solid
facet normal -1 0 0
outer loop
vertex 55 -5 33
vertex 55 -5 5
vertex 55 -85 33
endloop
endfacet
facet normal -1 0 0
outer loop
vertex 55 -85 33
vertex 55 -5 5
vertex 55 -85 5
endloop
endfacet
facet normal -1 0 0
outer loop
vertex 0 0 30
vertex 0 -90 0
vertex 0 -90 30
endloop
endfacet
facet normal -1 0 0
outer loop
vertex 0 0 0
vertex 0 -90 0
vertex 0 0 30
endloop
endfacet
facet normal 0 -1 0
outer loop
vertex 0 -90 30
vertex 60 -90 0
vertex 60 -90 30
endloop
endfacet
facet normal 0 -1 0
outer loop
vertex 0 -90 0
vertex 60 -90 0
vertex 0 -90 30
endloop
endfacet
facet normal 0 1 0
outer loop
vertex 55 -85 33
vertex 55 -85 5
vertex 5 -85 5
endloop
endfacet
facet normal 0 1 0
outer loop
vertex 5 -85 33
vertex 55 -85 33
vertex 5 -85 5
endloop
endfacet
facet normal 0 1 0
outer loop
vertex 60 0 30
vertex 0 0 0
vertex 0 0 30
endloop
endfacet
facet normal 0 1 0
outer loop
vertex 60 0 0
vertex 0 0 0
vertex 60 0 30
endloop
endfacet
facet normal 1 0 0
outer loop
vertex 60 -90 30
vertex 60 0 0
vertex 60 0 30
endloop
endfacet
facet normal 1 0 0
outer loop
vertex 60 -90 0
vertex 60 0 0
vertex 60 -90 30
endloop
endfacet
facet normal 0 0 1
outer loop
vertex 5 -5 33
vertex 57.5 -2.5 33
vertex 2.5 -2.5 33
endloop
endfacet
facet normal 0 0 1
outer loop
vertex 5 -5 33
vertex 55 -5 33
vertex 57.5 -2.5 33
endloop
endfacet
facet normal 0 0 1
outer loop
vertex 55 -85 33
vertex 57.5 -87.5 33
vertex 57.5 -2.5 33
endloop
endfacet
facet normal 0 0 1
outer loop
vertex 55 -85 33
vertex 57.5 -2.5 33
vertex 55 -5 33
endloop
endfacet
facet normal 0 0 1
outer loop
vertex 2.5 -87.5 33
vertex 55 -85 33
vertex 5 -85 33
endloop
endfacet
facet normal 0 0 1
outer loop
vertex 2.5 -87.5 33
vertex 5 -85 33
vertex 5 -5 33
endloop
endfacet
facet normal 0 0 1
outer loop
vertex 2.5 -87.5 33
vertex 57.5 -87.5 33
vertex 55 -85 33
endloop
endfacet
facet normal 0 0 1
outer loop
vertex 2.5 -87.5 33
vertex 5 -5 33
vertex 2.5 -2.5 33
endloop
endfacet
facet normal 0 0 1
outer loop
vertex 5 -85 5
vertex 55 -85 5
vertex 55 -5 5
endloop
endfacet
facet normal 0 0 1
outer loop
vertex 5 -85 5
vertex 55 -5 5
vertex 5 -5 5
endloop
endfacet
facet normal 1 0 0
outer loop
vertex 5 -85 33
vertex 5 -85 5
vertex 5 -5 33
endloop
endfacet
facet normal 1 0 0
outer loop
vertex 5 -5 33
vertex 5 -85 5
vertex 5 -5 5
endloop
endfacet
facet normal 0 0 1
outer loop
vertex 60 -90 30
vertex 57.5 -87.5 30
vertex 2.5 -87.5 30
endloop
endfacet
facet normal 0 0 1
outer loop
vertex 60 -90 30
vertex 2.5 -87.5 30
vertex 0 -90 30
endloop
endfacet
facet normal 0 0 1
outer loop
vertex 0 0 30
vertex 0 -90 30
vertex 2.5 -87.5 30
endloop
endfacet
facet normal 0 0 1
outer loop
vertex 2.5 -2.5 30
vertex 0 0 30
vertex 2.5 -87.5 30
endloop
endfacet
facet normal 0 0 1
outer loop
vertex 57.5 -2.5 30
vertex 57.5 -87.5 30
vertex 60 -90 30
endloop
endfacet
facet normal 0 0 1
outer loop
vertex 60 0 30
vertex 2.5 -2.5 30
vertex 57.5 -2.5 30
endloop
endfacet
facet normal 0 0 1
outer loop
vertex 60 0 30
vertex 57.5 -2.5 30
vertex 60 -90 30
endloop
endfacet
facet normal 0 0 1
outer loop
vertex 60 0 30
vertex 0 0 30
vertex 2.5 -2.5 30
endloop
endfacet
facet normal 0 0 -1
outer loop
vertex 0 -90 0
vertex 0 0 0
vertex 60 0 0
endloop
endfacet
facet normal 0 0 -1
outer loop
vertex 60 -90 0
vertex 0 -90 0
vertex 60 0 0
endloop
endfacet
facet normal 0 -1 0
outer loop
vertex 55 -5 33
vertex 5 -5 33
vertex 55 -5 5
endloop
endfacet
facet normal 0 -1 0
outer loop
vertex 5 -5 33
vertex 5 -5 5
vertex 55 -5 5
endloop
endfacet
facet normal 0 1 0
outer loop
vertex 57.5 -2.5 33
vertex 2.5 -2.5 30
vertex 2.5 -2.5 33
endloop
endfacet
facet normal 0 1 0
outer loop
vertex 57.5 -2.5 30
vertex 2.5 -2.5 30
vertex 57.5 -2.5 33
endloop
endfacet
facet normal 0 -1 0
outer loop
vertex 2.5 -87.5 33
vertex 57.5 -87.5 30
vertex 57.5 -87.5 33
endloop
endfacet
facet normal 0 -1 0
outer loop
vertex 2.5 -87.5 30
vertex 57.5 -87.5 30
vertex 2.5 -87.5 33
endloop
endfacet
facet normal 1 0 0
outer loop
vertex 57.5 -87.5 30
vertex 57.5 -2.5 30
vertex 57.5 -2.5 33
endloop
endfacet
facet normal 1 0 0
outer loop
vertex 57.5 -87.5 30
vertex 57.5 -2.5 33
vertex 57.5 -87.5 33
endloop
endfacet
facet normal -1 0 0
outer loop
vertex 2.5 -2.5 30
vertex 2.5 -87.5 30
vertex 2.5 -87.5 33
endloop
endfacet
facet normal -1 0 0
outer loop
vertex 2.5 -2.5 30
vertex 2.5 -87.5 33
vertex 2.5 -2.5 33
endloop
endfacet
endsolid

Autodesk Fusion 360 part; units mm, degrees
sketch "草图1" plane through (0, 0, 0) normal (0, 0, 1) x (1, 0, 0)
  line L0 (0, 0) -> (60, 0)
  line L1 (60, 0) -> (60, -90)
  line L2 (60, -90) -> (0, -90)
  line L3 (0, -90) -> (0, 0)
  dimension "d1" = 60
  dimension "d2" = 90
extrude "拉伸1" add sketch "草图1" along normal blind 30
sketch "草图2" plane through (0, 0, 30) normal (0, 0, 1) x (-1, 0, 0)
  line L0 (0, 90) -> (-60, 90)
  line L1 (-60, 90) -> (-60, 0)
  line L2 (-60, 0) -> (0, 0)
  line L3 (0, 0) -> (0, 90)
  line L4 (-5, 5) -> (-55, 5)
  line L5 (-55, 5) -> (-55, 85)
  line L6 (-55, 85) -> (-5, 85)
  line L7 (-5, 85) -> (-5, 5)
  dimension "d5" = 50
  dimension "d6" = 80
  dimension "d7" = 55
  dimension "d8" = 5
extrude "拉伸2" cut sketch "草图2" against normal blind 25 contours L4 L5 L6 L7
sketch "草图3" plane through (0, -90, 0) normal (0, -1, 0) x (1, 0, 0)
  line L0 (0, 0) -> (60, 0)
  line L1 (60, 0) -> (60, 30)
  line L2 (60, 30) -> (0, 30)
  line L3 (0, 30) -> (0, 0)
sketch "草图4" plane through (0, 0, 5) normal (0, 0, 1) x (-1, 0, 0)
  line L0 (-5, 85) -> (-55, 85)
  line L1 (-55, 85) -> (-55, 5)
  line L2 (-55, 5) -> (-5, 5)
  line L3 (-5, 5) -> (-5, 85)
  circle A0 centre (-15.0278, 14.2331) radius 0.5
sketch "草图5" plane through (0, 0, 30) normal (0, 0, 1) x (-1, 0, 0)
  line L0 (-55, 5) -> (-55, 85)
  line L1 (-55, 85) -> (-5, 85)
  line L2 (-5, 85) -> (-5, 5)
  line L3 (-5, 5) -> (-55, 5)
  line L4 (0, 90) -> (-60, 90)
  line L5 (-60, 90) -> (-60, 0)
  line L6 (-60, 0) -> (0, 0)
  line L7 (0, 0) -> (0, 90)
  line L8 (-2.5, 2.5) -> (-57.5, 2.5)
  line L9 (-57.5, 2.5) -> (-57.5, 87.5)
  line L10 (-57.5, 87.5) -> (-2.5, 87.5)
  line L11 (-2.5, 87.5) -> (-2.5, 2.5)
  dimension "d12" = 55
  dimension "d13" = 85
  dimension "d14" = 2.5
  dimension "d15" = 87.5
extrude "拉伸3" add sketch "草图5" along normal blind 3 contours L8 L9 L10 L11
